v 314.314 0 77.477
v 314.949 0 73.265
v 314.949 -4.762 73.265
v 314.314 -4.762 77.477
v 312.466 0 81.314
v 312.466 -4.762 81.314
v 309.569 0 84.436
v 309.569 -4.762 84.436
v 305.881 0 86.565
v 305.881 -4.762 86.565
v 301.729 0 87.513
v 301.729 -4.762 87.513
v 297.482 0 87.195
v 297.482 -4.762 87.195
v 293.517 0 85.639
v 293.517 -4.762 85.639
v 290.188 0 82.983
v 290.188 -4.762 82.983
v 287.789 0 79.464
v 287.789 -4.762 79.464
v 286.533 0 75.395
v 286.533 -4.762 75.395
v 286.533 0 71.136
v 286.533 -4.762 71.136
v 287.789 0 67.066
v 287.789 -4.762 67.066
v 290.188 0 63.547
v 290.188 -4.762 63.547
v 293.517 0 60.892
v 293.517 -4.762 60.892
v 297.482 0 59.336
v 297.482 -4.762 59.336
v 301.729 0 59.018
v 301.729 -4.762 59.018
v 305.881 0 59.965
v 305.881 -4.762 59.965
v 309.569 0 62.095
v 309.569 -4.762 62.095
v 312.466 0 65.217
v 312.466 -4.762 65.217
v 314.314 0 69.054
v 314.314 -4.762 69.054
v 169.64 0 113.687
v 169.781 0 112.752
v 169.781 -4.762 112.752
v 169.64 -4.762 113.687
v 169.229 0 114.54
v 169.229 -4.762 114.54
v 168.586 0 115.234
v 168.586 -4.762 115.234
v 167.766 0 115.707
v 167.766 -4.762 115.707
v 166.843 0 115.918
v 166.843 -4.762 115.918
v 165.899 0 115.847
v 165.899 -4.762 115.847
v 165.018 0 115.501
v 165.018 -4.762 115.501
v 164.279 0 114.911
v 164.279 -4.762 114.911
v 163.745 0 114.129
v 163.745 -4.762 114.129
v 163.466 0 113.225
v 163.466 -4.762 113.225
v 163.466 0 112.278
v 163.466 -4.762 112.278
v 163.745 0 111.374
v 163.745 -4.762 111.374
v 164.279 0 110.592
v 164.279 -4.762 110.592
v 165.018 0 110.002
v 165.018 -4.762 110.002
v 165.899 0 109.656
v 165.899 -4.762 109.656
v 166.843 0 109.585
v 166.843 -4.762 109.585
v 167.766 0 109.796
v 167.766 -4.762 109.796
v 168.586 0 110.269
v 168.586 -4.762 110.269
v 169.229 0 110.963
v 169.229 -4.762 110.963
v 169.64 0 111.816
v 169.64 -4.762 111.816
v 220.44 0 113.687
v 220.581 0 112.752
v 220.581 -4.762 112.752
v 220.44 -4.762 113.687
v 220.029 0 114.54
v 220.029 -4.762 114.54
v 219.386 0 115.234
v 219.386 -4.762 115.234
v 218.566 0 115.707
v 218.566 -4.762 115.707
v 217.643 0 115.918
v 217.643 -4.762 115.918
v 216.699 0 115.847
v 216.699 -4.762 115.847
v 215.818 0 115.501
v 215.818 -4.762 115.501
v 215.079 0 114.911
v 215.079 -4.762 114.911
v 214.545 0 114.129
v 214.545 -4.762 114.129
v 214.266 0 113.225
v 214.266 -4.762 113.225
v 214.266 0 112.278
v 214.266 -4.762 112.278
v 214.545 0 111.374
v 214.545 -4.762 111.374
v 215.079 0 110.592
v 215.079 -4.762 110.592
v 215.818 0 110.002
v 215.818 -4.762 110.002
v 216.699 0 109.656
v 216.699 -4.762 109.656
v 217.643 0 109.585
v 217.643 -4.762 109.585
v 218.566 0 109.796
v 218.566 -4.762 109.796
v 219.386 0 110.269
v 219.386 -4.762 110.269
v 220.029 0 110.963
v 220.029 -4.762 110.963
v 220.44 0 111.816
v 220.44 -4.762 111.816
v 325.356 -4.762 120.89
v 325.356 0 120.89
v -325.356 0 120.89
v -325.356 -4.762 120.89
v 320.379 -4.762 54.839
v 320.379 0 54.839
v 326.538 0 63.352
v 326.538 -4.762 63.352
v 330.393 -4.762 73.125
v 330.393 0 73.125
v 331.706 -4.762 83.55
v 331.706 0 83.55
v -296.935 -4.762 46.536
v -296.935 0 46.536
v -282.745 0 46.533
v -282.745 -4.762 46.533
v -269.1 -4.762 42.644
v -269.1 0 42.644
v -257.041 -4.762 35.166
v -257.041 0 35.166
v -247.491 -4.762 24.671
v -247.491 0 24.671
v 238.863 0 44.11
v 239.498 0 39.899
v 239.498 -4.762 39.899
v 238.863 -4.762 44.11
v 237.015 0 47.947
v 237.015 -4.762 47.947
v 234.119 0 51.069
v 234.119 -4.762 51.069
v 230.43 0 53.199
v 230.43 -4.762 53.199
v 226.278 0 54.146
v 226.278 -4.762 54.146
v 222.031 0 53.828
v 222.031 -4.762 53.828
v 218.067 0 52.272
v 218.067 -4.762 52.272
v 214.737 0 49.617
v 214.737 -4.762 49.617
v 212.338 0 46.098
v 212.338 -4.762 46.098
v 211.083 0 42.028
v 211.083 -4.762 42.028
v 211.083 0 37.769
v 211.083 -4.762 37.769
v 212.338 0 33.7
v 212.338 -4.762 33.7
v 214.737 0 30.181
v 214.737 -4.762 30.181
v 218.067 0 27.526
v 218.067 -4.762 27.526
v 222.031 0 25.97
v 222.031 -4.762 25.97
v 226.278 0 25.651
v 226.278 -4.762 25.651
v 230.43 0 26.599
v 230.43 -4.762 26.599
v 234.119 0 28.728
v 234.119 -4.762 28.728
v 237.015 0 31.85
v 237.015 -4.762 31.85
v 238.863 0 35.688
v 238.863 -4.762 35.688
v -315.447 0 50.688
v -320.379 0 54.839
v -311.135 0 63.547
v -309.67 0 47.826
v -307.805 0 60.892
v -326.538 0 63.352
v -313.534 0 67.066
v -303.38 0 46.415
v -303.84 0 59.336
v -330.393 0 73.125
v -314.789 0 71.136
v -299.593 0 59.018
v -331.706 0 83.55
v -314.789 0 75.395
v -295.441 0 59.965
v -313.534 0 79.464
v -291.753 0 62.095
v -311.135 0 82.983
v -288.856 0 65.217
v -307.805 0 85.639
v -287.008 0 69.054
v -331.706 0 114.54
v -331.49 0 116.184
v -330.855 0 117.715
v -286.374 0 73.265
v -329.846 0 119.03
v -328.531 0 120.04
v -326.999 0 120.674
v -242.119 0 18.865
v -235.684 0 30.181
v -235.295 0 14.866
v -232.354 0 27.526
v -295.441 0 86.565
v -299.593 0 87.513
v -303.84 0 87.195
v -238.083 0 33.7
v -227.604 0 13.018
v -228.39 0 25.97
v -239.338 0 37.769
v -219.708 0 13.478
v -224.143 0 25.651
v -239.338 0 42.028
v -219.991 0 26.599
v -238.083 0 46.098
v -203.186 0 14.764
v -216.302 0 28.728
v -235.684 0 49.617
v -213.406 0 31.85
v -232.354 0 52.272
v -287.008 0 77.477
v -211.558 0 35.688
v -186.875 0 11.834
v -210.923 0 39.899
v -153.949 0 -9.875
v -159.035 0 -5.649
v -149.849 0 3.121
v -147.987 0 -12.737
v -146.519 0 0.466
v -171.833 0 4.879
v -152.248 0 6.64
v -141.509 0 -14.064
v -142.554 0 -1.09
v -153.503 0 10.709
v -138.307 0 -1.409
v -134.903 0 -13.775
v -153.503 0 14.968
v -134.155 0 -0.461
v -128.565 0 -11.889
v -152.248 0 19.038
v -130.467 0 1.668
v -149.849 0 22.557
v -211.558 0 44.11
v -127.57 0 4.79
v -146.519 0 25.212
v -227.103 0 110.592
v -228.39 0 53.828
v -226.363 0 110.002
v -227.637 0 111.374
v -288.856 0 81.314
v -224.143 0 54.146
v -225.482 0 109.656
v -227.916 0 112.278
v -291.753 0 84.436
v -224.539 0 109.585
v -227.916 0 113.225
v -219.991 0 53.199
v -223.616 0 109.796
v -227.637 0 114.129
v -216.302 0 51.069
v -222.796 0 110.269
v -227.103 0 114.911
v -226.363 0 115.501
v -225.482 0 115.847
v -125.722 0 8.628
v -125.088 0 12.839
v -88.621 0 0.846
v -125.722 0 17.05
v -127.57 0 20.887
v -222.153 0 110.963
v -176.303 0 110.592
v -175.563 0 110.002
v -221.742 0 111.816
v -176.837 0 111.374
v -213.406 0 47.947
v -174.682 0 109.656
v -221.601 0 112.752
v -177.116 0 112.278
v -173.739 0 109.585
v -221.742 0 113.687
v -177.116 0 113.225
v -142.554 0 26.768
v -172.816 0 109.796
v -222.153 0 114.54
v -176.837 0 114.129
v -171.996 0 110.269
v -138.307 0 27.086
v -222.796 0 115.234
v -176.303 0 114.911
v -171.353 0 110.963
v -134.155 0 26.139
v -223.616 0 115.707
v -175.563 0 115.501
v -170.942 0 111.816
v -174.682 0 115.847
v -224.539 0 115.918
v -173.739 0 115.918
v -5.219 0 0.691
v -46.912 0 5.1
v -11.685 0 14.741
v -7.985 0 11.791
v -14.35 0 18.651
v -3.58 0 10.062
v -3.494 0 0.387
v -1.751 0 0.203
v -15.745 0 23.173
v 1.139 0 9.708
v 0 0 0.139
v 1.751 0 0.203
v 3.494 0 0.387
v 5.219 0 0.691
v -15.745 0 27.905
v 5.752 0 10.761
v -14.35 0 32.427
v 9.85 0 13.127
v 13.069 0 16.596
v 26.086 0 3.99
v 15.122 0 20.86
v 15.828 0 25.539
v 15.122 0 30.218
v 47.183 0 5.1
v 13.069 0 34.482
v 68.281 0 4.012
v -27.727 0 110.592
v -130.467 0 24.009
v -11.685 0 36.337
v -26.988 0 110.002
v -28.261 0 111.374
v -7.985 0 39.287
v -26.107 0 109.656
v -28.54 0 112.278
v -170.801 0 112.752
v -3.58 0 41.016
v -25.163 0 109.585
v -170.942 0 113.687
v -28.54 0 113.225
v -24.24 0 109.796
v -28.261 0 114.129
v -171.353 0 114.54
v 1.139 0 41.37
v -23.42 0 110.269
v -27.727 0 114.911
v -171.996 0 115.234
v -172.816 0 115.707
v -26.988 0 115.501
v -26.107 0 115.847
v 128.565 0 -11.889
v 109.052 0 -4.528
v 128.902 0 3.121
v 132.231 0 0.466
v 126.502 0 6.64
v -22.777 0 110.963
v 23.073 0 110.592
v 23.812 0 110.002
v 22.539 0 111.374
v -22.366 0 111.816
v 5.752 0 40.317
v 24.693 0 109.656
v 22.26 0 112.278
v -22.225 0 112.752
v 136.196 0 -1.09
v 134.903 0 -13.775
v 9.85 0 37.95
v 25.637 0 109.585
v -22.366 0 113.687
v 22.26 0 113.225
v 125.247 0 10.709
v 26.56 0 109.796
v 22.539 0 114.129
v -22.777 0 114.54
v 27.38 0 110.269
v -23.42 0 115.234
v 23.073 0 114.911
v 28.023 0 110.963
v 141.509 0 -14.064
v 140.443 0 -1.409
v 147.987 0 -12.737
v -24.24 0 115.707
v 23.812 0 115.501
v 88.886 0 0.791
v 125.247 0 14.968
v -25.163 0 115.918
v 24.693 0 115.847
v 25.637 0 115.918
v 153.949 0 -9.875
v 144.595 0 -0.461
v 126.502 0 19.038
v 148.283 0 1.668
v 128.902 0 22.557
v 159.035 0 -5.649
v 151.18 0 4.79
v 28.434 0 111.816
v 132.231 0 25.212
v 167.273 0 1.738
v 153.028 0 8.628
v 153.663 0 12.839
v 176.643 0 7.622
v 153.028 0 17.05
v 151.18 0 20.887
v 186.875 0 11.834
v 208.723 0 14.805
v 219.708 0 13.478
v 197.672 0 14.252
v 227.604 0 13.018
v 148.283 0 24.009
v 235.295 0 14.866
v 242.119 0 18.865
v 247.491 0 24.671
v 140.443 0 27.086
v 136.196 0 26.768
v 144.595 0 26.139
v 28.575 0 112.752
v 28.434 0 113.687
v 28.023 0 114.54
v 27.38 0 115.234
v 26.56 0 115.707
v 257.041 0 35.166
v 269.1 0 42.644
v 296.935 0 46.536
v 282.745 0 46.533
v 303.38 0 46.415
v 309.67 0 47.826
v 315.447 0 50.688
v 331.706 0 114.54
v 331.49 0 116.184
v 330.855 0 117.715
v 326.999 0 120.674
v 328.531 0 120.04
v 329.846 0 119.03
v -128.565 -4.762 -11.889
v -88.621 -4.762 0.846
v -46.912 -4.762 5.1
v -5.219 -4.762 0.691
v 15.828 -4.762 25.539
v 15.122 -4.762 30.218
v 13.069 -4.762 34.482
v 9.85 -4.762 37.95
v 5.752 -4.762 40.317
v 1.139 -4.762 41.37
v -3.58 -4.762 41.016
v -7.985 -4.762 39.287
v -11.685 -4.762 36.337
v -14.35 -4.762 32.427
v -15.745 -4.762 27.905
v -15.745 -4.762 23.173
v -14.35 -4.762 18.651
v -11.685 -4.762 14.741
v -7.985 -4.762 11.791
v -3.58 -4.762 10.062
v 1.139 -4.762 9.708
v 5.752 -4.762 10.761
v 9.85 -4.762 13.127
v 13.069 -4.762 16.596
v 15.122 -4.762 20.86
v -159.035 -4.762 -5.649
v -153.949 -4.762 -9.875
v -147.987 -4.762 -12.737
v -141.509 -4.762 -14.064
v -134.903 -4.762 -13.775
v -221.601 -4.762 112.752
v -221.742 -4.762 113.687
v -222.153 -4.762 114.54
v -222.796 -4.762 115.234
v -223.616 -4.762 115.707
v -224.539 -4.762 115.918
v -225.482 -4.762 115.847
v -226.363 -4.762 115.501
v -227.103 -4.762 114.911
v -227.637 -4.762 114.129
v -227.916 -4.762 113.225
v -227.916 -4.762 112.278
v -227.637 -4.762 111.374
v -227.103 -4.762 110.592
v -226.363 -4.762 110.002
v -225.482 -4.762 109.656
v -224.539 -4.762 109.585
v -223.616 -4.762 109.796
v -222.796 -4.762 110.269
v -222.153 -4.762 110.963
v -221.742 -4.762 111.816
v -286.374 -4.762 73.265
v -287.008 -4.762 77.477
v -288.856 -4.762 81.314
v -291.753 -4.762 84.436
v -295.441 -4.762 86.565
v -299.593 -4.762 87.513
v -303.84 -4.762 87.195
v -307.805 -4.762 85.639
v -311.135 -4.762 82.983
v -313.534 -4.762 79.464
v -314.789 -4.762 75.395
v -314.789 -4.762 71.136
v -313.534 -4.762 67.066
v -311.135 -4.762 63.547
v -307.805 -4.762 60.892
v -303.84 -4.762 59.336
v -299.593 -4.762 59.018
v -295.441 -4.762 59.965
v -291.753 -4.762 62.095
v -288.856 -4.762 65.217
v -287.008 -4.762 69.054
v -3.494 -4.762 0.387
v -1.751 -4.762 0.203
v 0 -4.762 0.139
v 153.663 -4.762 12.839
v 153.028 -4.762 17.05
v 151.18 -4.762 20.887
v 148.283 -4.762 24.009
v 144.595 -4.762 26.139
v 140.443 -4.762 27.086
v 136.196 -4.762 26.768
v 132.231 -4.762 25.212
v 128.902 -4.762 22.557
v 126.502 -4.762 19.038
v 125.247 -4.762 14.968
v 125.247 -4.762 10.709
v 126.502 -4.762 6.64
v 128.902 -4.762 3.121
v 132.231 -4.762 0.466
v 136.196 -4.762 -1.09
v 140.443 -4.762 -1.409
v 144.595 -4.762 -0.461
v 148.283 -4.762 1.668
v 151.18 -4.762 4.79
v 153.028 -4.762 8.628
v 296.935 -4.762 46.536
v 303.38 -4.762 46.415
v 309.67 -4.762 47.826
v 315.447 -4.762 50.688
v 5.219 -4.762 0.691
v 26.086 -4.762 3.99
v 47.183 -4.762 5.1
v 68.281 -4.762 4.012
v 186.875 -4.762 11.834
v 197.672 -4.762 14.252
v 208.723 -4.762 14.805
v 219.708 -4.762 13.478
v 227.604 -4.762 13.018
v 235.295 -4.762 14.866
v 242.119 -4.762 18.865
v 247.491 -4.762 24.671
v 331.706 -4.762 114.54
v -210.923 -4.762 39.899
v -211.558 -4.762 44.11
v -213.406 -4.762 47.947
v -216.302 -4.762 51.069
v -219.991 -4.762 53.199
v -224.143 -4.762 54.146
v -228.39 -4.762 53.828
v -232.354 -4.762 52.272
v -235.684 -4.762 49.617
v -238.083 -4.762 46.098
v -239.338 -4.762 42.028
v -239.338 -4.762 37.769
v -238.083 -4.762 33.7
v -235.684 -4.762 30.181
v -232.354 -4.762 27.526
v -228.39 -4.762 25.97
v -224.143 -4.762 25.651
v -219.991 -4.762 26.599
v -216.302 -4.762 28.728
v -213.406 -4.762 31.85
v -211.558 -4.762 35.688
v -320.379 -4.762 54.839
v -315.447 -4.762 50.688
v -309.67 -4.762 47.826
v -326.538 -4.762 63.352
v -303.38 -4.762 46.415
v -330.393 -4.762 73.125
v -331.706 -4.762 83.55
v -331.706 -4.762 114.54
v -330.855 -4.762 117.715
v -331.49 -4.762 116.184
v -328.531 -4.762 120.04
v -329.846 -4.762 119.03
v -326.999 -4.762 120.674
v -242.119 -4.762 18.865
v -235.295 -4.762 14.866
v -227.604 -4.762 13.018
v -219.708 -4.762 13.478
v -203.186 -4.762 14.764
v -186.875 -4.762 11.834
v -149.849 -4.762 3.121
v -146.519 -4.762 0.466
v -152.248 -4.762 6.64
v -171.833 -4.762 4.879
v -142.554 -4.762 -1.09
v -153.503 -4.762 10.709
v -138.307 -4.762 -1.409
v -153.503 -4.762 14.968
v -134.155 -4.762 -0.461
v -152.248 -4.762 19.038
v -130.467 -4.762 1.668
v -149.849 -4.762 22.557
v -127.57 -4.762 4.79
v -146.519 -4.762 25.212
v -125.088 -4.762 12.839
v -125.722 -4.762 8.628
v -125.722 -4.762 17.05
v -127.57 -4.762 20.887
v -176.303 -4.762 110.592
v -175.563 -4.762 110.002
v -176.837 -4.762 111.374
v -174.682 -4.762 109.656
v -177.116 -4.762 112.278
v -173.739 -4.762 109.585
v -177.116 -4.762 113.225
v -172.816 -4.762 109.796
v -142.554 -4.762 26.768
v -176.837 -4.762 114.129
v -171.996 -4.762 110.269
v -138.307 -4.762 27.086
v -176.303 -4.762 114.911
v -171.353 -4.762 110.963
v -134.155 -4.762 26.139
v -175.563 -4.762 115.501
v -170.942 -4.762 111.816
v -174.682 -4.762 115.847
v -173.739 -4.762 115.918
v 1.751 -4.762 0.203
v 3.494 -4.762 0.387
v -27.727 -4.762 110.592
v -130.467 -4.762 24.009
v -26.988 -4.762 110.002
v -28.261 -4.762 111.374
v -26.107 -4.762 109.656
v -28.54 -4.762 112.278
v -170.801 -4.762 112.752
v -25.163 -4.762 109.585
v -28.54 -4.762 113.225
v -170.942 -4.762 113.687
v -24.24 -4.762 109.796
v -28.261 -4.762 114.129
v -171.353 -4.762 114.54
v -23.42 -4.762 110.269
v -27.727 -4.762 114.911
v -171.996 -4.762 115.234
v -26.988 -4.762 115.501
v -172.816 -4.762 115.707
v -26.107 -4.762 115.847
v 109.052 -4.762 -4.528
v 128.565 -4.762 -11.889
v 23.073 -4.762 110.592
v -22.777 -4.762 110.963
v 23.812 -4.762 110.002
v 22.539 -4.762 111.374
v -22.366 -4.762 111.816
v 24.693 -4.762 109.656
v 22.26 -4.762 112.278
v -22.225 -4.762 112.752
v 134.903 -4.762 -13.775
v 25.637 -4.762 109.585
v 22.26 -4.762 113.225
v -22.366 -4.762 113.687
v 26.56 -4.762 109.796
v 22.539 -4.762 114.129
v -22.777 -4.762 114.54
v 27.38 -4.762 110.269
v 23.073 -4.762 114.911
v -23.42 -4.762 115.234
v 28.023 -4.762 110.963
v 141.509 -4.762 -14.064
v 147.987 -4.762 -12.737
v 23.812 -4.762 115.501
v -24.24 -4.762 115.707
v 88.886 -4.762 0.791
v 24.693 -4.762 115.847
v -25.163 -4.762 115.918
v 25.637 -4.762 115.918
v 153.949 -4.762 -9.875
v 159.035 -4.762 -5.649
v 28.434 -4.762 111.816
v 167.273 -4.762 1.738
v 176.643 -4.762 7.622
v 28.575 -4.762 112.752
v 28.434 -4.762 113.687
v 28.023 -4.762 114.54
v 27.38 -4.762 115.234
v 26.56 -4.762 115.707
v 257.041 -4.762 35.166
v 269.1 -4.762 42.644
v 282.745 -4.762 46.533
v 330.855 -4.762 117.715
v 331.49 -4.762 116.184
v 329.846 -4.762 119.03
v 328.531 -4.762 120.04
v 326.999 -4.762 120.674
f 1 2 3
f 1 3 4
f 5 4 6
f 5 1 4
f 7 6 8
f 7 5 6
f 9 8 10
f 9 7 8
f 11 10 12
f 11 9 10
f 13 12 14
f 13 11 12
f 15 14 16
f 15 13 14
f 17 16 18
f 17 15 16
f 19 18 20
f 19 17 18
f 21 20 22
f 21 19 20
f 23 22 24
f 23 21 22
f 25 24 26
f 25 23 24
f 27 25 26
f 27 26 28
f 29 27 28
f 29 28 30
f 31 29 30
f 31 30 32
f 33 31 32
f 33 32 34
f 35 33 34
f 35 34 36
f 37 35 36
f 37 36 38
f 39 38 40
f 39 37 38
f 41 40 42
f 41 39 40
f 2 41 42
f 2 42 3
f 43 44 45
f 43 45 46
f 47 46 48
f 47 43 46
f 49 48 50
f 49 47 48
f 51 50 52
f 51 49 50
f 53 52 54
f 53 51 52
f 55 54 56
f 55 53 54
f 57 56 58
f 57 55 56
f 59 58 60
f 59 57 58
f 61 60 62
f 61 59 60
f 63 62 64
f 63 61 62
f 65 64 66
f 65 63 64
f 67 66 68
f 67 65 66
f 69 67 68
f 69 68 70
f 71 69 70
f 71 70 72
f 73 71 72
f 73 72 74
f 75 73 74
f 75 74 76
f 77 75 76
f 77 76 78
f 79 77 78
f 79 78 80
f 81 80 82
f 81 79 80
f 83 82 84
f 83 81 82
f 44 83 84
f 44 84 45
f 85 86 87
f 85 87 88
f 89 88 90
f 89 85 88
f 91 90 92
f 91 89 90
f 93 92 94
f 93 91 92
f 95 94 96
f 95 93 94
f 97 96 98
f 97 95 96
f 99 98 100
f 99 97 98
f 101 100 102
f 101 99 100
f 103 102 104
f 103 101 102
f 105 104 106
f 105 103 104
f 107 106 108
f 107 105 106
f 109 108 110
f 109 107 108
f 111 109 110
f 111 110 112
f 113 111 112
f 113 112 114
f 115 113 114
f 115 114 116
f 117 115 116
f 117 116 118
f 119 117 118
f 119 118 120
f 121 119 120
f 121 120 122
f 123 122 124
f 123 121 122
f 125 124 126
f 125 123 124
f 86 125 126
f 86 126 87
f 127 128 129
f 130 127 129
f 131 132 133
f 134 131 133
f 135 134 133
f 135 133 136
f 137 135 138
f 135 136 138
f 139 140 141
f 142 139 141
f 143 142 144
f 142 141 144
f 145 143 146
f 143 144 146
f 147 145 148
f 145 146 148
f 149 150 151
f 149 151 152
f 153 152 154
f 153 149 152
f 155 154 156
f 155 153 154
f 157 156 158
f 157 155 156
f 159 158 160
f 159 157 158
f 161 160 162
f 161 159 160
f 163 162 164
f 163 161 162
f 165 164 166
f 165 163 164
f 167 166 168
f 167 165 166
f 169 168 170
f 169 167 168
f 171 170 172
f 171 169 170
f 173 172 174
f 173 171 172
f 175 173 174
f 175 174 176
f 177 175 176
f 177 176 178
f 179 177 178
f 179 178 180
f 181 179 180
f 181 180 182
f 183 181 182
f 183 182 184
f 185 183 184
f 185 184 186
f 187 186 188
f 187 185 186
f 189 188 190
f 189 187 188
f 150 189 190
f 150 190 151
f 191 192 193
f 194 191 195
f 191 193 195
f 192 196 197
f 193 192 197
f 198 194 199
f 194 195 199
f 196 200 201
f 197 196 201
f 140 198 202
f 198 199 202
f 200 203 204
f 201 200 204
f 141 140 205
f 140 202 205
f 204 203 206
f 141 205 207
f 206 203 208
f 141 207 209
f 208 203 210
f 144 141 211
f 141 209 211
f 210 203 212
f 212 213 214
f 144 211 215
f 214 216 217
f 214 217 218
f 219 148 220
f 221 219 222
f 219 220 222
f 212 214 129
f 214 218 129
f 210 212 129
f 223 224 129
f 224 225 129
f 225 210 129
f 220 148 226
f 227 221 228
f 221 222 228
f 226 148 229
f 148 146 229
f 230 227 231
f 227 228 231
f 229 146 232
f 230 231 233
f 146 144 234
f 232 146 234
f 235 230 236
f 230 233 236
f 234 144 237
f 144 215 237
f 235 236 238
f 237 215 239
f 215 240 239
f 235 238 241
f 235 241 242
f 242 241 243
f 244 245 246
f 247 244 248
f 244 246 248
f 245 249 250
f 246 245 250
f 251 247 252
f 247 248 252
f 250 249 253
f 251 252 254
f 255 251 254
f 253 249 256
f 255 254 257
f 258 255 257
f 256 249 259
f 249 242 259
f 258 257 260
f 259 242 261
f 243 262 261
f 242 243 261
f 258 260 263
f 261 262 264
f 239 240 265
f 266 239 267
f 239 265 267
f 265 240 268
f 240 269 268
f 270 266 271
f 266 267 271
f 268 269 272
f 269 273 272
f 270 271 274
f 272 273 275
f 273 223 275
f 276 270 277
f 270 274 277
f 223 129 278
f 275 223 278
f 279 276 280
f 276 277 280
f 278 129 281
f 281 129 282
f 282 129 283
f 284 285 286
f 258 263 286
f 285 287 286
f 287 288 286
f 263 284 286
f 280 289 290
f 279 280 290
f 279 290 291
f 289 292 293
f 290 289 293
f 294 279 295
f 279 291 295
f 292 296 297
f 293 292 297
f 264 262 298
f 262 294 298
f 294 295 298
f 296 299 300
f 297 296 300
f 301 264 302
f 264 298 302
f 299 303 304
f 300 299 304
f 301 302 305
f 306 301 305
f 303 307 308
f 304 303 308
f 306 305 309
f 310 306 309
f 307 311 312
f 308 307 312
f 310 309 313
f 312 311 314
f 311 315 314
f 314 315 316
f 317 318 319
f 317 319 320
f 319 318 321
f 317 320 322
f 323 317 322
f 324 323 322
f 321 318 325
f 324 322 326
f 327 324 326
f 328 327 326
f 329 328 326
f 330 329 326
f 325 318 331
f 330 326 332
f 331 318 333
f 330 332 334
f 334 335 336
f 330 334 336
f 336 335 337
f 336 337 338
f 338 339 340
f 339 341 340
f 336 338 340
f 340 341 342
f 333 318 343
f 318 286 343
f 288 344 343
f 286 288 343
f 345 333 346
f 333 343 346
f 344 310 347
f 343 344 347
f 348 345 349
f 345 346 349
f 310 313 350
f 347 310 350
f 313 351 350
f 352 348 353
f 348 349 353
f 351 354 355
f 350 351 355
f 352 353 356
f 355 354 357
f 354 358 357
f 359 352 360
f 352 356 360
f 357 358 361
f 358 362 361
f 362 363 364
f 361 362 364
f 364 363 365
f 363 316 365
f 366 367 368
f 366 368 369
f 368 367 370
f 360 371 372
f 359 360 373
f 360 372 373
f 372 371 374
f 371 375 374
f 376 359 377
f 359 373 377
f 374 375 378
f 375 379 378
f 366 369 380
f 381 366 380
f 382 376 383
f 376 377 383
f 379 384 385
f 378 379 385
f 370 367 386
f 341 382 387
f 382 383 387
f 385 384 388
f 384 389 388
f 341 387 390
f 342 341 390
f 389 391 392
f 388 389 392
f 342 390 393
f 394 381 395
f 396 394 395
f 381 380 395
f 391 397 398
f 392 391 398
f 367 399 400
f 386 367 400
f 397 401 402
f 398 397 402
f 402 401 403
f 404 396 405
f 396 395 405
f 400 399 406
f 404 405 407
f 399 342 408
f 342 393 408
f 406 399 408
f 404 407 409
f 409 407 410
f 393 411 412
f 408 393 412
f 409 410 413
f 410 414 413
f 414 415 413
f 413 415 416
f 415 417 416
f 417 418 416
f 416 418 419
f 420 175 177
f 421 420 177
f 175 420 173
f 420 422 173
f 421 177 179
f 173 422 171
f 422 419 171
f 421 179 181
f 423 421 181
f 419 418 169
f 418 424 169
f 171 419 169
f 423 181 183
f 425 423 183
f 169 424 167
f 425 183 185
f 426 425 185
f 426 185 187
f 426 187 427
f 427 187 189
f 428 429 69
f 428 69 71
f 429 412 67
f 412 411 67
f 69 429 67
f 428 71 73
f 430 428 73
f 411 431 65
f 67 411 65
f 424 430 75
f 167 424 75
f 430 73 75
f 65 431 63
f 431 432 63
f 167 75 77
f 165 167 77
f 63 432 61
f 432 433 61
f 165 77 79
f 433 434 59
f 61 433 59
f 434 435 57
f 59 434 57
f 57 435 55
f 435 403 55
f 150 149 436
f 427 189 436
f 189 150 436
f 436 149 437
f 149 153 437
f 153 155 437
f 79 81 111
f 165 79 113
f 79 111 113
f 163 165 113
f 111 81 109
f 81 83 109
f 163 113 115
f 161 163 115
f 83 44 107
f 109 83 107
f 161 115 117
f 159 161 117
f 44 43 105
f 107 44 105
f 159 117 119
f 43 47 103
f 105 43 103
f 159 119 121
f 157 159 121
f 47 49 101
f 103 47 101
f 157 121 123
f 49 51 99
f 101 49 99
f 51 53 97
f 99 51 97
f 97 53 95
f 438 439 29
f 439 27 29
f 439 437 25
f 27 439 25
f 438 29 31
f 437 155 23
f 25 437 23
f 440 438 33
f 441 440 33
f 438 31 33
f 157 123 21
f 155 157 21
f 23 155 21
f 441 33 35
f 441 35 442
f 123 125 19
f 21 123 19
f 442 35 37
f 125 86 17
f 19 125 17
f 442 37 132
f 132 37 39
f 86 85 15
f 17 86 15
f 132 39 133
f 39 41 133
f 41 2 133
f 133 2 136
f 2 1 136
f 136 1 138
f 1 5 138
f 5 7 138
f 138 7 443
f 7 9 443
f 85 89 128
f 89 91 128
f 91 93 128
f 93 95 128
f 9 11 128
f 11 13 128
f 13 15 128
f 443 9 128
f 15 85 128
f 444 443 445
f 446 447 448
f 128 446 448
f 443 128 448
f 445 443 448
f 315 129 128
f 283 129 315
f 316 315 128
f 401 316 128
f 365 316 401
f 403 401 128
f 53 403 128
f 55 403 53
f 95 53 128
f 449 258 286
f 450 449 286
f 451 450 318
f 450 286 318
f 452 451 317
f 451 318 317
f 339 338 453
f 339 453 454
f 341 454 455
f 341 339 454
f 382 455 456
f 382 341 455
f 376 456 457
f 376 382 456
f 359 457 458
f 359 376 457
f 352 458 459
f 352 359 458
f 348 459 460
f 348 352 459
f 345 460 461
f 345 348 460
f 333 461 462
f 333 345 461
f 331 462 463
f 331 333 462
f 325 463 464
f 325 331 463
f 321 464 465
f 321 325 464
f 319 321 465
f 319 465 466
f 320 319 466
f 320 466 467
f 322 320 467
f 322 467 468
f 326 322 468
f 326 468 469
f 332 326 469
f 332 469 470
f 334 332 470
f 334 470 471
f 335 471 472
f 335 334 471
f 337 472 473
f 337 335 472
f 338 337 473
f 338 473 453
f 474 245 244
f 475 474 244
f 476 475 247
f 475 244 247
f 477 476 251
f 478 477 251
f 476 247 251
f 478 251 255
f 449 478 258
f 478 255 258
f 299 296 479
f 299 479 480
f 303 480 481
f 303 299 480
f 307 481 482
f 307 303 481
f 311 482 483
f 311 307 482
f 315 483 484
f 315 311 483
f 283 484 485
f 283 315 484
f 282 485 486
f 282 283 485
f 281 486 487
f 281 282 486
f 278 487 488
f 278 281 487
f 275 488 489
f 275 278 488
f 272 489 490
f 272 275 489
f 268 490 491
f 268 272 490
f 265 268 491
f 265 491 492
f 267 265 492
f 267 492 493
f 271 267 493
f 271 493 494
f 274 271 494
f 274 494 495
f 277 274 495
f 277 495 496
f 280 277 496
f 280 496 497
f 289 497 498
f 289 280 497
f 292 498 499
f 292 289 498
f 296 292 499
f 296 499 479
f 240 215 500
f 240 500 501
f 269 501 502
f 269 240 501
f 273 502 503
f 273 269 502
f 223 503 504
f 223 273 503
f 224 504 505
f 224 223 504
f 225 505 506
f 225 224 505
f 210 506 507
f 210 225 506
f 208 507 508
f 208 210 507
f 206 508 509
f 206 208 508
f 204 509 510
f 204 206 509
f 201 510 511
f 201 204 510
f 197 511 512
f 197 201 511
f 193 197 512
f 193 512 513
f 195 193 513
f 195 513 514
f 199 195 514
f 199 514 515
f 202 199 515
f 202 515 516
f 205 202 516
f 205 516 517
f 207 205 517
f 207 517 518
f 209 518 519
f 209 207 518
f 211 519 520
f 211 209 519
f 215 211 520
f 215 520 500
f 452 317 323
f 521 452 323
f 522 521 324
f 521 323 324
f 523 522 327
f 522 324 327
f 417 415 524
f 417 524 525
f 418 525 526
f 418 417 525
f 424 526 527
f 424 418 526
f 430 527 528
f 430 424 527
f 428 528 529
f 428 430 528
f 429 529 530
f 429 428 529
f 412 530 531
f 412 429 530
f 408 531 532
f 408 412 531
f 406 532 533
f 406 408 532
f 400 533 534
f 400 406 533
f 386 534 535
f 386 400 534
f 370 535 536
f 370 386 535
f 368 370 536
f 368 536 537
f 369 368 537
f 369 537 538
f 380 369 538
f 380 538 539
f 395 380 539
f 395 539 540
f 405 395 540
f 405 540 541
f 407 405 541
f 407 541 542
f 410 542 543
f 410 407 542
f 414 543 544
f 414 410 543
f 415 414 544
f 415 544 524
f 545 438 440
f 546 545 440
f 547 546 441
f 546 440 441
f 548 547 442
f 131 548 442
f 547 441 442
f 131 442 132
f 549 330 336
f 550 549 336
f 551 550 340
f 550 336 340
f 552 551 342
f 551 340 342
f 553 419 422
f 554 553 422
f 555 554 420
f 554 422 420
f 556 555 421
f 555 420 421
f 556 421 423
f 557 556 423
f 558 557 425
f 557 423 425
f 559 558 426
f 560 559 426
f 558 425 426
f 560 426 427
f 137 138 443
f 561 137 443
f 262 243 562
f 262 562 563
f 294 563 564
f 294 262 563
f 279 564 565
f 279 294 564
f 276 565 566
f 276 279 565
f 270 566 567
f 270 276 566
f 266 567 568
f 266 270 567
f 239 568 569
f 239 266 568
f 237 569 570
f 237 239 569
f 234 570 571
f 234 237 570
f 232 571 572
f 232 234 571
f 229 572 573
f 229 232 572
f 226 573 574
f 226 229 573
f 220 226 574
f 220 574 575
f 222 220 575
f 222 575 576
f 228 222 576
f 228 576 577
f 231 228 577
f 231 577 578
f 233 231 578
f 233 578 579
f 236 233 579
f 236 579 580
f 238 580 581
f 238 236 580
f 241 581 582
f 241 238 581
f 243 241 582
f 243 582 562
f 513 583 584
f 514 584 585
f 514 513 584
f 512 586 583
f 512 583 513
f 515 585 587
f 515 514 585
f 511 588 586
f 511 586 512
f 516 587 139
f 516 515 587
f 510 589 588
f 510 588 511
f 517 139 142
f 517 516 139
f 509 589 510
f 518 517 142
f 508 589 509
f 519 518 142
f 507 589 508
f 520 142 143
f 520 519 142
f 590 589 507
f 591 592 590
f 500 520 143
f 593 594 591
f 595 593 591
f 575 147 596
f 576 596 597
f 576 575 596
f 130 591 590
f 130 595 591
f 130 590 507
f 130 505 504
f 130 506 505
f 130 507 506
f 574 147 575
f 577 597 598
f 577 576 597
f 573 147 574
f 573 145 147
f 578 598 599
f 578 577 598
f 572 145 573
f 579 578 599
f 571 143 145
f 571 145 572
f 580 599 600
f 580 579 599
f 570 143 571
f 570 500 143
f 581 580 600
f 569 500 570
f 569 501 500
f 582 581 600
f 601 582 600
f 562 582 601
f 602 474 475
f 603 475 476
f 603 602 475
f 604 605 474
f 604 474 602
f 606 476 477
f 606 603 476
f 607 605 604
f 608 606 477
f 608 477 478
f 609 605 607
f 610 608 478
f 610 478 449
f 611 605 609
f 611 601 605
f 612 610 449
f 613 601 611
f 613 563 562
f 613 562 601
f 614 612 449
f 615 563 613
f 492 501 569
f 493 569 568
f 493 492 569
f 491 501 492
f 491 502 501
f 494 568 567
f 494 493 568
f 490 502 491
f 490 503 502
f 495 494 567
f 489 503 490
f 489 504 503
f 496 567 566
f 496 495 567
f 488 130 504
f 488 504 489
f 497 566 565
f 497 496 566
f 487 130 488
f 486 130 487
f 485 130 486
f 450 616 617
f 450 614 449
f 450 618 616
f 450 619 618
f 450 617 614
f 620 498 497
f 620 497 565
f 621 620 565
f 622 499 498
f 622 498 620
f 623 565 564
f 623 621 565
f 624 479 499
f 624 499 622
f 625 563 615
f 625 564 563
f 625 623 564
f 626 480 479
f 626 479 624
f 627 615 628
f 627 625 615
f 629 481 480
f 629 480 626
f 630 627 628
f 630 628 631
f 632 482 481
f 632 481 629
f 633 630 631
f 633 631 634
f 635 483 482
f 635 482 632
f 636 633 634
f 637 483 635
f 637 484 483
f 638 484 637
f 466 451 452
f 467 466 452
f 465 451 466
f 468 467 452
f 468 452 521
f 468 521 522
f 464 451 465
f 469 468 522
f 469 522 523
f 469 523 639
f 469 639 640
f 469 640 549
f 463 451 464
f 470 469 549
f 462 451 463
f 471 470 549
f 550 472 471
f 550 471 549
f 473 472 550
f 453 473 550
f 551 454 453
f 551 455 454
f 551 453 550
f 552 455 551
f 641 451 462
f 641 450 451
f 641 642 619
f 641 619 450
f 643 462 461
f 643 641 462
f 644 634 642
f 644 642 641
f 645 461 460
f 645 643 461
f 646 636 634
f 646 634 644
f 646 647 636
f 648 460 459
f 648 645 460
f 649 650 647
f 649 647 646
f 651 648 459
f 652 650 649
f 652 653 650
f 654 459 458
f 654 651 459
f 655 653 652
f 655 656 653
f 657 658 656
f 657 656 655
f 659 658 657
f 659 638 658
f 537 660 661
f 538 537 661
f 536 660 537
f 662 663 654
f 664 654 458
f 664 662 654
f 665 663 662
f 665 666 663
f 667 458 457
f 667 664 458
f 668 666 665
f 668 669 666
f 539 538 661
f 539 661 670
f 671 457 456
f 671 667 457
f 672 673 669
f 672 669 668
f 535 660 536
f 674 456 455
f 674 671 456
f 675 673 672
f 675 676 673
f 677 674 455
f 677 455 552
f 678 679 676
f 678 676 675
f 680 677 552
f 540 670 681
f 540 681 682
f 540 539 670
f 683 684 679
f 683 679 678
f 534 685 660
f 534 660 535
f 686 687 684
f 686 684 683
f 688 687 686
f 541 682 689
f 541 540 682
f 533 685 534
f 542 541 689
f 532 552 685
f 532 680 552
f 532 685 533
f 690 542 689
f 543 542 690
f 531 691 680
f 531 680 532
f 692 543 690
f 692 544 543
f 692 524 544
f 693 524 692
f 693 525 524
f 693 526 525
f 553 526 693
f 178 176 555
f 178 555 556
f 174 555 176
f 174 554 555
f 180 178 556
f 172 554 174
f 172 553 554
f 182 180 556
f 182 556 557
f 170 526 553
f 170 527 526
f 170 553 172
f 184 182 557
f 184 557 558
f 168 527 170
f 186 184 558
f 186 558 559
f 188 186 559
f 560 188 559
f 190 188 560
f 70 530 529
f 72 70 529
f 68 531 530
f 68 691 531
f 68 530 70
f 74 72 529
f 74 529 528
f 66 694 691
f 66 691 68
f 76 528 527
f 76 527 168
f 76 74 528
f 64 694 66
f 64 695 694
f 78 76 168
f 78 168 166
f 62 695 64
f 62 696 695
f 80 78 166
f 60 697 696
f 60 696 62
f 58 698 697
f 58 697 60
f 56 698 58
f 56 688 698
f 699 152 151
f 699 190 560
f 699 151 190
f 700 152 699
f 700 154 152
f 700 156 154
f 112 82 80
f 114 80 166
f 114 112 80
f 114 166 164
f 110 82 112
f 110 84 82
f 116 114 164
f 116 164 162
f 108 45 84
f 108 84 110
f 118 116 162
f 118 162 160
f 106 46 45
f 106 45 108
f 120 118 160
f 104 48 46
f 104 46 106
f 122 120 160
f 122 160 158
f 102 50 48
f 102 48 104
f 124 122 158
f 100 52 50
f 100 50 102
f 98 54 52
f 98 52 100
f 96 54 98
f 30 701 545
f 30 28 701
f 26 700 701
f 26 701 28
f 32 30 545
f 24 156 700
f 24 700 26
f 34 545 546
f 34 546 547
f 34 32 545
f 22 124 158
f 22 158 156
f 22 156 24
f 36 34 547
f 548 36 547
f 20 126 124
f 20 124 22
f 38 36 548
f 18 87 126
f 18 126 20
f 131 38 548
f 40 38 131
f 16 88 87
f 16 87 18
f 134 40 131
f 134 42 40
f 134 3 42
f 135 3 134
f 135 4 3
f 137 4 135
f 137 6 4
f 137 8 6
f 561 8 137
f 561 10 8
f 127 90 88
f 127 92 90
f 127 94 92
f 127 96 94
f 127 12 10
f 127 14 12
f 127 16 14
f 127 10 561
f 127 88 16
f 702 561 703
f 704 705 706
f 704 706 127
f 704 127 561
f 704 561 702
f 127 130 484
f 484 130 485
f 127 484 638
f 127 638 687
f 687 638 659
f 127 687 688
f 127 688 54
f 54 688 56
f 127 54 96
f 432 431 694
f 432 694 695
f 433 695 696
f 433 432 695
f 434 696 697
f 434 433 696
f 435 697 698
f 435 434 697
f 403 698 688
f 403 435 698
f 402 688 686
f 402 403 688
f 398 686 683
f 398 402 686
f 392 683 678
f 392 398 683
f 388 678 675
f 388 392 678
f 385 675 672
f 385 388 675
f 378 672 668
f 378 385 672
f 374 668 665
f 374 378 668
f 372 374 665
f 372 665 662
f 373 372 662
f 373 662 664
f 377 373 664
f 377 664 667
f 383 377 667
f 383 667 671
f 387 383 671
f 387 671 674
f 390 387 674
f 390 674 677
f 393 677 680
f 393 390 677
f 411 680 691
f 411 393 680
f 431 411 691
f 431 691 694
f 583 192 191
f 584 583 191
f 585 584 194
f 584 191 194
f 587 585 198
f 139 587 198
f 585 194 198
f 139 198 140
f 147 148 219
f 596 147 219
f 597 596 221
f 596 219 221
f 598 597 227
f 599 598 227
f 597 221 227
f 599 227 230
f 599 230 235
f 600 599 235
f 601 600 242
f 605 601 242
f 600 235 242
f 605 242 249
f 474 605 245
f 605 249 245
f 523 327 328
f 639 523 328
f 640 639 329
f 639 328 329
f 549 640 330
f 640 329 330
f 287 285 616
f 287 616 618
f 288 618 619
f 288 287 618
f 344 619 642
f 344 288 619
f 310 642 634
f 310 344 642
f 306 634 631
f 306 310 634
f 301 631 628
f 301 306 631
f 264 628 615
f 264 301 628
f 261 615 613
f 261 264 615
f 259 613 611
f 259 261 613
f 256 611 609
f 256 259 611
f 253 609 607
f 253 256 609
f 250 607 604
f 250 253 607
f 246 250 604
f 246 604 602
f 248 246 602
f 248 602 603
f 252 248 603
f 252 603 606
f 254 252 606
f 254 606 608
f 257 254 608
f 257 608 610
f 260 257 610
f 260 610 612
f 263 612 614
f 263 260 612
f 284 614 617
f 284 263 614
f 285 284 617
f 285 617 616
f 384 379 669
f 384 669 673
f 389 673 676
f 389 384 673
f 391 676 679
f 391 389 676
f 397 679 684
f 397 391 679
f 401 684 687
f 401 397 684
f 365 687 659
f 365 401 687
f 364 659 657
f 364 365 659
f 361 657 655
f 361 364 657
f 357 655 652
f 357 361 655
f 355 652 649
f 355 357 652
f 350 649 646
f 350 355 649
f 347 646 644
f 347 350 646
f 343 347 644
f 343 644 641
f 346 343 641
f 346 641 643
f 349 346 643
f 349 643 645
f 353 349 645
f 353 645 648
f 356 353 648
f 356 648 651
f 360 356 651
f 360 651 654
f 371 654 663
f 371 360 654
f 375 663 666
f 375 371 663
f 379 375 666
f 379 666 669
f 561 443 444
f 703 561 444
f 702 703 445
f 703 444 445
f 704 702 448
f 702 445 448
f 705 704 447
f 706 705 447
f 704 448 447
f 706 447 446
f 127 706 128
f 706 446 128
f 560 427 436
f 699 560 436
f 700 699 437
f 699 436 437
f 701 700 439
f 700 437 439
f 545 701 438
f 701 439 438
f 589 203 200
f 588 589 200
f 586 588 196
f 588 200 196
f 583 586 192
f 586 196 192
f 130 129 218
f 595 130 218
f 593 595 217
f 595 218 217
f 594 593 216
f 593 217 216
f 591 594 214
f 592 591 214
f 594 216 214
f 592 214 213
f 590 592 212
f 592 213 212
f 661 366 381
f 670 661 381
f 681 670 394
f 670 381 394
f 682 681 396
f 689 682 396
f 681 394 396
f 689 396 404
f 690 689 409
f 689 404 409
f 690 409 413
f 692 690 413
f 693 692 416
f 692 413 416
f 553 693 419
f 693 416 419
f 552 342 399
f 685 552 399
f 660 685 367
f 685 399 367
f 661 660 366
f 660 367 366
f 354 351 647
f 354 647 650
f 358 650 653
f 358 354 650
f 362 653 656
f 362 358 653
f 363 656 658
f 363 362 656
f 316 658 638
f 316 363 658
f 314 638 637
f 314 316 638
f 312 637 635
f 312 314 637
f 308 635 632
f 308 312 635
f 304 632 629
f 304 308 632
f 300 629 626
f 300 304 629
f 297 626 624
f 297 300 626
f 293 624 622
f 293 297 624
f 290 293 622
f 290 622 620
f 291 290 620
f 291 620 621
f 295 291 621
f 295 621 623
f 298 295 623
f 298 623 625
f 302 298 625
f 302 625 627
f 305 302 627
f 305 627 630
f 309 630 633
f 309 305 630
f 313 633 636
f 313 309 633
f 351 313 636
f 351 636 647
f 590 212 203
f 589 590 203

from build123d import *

# Parameters (mm, degrees)
F0_R     = 14.2875
F0_R_2   = 15.875
F0_R_3   = 3.175
F1_DEPTH = 4.7625


with BuildPart() as f1:
    # F0 (on Front) → F1 (new body)
    with BuildSketch(Plane.XZ):
        with BuildLine():
            ThreePointArc((320.379174, 54.839155), (328.771893, 68.117601), (331.705949, 83.549587))
            Line((331.705949, 83.549587), (331.705949, 114.540323))
            ThreePointArc((331.705949, 114.540323), (329.846077, 119.030451), (325.355949, 120.890323))
            Line((325.355949, 120.890323), (0, 120.890323))
            Line((0, 120.890323), (-325.355949, 120.890323))
            ThreePointArc((-325.355949, 120.890323), (-329.846077, 119.030451), (-331.705949, 114.540323))
            Line((-331.705949, 114.540323), (-331.705949, 83.549587))
            ThreePointArc((-331.705949, 83.549587), (-328.771893, 68.117601), (-320.379174, 54.839155))
            ThreePointArc((-320.379174, 54.839155), (-309.670458, 47.826041), (-296.934801, 46.536319))
            ThreePointArc((-296.934801, 46.536319), (-269.099557, 42.644178), (-247.49135, 24.671004))
            ThreePointArc((-247.49135, 24.671004), (-235.295113, 14.866395), (-219.708208, 13.478246))
            ThreePointArc((-219.708208, 13.478246), (-186.874924, 11.834063), (-159.034985, -5.649233))
            ThreePointArc((-159.034985, -5.649233), (-144.789086, -13.599949), (-128.564673, -11.888835))
            ThreePointArc((-128.564673, -11.888835), (-67.876372, 4.053452), (-5.219212, 0.690928))
            ThreePointArc((-5.219212, 0.690928), (-2.623901, 0.279775), (0, 0.138953))
            ThreePointArc((0, 0.138953), (2.623901, 0.279775), (5.219212, 0.690928))
            ThreePointArc((5.219212, 0.690928), (36.620267, 4.819782), (68.281297, 4.011744))
            ThreePointArc((68.281297, 4.011744), (99.037359, -1.609285), (128.564673, -11.888835))
            ThreePointArc((128.564673, -11.888835), (144.789086, -13.599949), (159.034985, -5.649233))
            ThreePointArc((159.034985, -5.649233), (171.832729, 4.879417), (186.874924, 11.834063))
            ThreePointArc((186.874924, 11.834063), (203.186029, 14.763672), (219.708208, 13.478246))
            ThreePointArc((219.708208, 13.478246), (235.295113, 14.866395), (247.49135, 24.671004))
            ThreePointArc((247.49135, 24.671004), (269.099557, 42.644178), (296.934801, 46.536319))
            ThreePointArc((296.934801, 46.536319), (309.670458, 47.826041), (320.379174, 54.839155))
        make_face()
        with Locations((-139.375032, 12.838909)):
            Circle(F0_R, mode=Mode.SUBTRACT)
        with Locations((-225.210487, 39.898884)):
            Circle(F0_R, mode=Mode.SUBTRACT)
        with Locations((-0.047461, 25.538909)):
            Circle(F0_R_2, mode=Mode.SUBTRACT)
        with Locations((139.375032, 12.838909)):
            Circle(F0_R, mode=Mode.SUBTRACT)
        with Locations((225.210487, 39.898884)):
            Circle(F0_R, mode=Mode.SUBTRACT)
        with Locations((-300.661124, 73.265323)):
            Circle(F0_R, mode=Mode.SUBTRACT)
        with Locations((-224.775985, 112.751594)):
            Circle(F0_R_3, mode=Mode.SUBTRACT)
        with Locations((-173.975985, 112.751594)):
            Circle(F0_R_3, mode=Mode.SUBTRACT)
        with Locations((-25.4, 112.751594)):
            Circle(F0_R_3, mode=Mode.SUBTRACT)
        with Locations((300.661124, 73.265323)):
            Circle(F0_R, mode=Mode.SUBTRACT)
        with Locations((25.4, 112.751594)):
            Circle(F0_R_3, mode=Mode.SUBTRACT)
        with Locations((166.605949, 112.751594)):
            Circle(F0_R_3, mode=Mode.SUBTRACT)
        with Locations((217.405949, 112.751594)):
            Circle(F0_R_3, mode=Mode.SUBTRACT)
    extrude(amount=F1_DEPTH)


solid = f1.part
